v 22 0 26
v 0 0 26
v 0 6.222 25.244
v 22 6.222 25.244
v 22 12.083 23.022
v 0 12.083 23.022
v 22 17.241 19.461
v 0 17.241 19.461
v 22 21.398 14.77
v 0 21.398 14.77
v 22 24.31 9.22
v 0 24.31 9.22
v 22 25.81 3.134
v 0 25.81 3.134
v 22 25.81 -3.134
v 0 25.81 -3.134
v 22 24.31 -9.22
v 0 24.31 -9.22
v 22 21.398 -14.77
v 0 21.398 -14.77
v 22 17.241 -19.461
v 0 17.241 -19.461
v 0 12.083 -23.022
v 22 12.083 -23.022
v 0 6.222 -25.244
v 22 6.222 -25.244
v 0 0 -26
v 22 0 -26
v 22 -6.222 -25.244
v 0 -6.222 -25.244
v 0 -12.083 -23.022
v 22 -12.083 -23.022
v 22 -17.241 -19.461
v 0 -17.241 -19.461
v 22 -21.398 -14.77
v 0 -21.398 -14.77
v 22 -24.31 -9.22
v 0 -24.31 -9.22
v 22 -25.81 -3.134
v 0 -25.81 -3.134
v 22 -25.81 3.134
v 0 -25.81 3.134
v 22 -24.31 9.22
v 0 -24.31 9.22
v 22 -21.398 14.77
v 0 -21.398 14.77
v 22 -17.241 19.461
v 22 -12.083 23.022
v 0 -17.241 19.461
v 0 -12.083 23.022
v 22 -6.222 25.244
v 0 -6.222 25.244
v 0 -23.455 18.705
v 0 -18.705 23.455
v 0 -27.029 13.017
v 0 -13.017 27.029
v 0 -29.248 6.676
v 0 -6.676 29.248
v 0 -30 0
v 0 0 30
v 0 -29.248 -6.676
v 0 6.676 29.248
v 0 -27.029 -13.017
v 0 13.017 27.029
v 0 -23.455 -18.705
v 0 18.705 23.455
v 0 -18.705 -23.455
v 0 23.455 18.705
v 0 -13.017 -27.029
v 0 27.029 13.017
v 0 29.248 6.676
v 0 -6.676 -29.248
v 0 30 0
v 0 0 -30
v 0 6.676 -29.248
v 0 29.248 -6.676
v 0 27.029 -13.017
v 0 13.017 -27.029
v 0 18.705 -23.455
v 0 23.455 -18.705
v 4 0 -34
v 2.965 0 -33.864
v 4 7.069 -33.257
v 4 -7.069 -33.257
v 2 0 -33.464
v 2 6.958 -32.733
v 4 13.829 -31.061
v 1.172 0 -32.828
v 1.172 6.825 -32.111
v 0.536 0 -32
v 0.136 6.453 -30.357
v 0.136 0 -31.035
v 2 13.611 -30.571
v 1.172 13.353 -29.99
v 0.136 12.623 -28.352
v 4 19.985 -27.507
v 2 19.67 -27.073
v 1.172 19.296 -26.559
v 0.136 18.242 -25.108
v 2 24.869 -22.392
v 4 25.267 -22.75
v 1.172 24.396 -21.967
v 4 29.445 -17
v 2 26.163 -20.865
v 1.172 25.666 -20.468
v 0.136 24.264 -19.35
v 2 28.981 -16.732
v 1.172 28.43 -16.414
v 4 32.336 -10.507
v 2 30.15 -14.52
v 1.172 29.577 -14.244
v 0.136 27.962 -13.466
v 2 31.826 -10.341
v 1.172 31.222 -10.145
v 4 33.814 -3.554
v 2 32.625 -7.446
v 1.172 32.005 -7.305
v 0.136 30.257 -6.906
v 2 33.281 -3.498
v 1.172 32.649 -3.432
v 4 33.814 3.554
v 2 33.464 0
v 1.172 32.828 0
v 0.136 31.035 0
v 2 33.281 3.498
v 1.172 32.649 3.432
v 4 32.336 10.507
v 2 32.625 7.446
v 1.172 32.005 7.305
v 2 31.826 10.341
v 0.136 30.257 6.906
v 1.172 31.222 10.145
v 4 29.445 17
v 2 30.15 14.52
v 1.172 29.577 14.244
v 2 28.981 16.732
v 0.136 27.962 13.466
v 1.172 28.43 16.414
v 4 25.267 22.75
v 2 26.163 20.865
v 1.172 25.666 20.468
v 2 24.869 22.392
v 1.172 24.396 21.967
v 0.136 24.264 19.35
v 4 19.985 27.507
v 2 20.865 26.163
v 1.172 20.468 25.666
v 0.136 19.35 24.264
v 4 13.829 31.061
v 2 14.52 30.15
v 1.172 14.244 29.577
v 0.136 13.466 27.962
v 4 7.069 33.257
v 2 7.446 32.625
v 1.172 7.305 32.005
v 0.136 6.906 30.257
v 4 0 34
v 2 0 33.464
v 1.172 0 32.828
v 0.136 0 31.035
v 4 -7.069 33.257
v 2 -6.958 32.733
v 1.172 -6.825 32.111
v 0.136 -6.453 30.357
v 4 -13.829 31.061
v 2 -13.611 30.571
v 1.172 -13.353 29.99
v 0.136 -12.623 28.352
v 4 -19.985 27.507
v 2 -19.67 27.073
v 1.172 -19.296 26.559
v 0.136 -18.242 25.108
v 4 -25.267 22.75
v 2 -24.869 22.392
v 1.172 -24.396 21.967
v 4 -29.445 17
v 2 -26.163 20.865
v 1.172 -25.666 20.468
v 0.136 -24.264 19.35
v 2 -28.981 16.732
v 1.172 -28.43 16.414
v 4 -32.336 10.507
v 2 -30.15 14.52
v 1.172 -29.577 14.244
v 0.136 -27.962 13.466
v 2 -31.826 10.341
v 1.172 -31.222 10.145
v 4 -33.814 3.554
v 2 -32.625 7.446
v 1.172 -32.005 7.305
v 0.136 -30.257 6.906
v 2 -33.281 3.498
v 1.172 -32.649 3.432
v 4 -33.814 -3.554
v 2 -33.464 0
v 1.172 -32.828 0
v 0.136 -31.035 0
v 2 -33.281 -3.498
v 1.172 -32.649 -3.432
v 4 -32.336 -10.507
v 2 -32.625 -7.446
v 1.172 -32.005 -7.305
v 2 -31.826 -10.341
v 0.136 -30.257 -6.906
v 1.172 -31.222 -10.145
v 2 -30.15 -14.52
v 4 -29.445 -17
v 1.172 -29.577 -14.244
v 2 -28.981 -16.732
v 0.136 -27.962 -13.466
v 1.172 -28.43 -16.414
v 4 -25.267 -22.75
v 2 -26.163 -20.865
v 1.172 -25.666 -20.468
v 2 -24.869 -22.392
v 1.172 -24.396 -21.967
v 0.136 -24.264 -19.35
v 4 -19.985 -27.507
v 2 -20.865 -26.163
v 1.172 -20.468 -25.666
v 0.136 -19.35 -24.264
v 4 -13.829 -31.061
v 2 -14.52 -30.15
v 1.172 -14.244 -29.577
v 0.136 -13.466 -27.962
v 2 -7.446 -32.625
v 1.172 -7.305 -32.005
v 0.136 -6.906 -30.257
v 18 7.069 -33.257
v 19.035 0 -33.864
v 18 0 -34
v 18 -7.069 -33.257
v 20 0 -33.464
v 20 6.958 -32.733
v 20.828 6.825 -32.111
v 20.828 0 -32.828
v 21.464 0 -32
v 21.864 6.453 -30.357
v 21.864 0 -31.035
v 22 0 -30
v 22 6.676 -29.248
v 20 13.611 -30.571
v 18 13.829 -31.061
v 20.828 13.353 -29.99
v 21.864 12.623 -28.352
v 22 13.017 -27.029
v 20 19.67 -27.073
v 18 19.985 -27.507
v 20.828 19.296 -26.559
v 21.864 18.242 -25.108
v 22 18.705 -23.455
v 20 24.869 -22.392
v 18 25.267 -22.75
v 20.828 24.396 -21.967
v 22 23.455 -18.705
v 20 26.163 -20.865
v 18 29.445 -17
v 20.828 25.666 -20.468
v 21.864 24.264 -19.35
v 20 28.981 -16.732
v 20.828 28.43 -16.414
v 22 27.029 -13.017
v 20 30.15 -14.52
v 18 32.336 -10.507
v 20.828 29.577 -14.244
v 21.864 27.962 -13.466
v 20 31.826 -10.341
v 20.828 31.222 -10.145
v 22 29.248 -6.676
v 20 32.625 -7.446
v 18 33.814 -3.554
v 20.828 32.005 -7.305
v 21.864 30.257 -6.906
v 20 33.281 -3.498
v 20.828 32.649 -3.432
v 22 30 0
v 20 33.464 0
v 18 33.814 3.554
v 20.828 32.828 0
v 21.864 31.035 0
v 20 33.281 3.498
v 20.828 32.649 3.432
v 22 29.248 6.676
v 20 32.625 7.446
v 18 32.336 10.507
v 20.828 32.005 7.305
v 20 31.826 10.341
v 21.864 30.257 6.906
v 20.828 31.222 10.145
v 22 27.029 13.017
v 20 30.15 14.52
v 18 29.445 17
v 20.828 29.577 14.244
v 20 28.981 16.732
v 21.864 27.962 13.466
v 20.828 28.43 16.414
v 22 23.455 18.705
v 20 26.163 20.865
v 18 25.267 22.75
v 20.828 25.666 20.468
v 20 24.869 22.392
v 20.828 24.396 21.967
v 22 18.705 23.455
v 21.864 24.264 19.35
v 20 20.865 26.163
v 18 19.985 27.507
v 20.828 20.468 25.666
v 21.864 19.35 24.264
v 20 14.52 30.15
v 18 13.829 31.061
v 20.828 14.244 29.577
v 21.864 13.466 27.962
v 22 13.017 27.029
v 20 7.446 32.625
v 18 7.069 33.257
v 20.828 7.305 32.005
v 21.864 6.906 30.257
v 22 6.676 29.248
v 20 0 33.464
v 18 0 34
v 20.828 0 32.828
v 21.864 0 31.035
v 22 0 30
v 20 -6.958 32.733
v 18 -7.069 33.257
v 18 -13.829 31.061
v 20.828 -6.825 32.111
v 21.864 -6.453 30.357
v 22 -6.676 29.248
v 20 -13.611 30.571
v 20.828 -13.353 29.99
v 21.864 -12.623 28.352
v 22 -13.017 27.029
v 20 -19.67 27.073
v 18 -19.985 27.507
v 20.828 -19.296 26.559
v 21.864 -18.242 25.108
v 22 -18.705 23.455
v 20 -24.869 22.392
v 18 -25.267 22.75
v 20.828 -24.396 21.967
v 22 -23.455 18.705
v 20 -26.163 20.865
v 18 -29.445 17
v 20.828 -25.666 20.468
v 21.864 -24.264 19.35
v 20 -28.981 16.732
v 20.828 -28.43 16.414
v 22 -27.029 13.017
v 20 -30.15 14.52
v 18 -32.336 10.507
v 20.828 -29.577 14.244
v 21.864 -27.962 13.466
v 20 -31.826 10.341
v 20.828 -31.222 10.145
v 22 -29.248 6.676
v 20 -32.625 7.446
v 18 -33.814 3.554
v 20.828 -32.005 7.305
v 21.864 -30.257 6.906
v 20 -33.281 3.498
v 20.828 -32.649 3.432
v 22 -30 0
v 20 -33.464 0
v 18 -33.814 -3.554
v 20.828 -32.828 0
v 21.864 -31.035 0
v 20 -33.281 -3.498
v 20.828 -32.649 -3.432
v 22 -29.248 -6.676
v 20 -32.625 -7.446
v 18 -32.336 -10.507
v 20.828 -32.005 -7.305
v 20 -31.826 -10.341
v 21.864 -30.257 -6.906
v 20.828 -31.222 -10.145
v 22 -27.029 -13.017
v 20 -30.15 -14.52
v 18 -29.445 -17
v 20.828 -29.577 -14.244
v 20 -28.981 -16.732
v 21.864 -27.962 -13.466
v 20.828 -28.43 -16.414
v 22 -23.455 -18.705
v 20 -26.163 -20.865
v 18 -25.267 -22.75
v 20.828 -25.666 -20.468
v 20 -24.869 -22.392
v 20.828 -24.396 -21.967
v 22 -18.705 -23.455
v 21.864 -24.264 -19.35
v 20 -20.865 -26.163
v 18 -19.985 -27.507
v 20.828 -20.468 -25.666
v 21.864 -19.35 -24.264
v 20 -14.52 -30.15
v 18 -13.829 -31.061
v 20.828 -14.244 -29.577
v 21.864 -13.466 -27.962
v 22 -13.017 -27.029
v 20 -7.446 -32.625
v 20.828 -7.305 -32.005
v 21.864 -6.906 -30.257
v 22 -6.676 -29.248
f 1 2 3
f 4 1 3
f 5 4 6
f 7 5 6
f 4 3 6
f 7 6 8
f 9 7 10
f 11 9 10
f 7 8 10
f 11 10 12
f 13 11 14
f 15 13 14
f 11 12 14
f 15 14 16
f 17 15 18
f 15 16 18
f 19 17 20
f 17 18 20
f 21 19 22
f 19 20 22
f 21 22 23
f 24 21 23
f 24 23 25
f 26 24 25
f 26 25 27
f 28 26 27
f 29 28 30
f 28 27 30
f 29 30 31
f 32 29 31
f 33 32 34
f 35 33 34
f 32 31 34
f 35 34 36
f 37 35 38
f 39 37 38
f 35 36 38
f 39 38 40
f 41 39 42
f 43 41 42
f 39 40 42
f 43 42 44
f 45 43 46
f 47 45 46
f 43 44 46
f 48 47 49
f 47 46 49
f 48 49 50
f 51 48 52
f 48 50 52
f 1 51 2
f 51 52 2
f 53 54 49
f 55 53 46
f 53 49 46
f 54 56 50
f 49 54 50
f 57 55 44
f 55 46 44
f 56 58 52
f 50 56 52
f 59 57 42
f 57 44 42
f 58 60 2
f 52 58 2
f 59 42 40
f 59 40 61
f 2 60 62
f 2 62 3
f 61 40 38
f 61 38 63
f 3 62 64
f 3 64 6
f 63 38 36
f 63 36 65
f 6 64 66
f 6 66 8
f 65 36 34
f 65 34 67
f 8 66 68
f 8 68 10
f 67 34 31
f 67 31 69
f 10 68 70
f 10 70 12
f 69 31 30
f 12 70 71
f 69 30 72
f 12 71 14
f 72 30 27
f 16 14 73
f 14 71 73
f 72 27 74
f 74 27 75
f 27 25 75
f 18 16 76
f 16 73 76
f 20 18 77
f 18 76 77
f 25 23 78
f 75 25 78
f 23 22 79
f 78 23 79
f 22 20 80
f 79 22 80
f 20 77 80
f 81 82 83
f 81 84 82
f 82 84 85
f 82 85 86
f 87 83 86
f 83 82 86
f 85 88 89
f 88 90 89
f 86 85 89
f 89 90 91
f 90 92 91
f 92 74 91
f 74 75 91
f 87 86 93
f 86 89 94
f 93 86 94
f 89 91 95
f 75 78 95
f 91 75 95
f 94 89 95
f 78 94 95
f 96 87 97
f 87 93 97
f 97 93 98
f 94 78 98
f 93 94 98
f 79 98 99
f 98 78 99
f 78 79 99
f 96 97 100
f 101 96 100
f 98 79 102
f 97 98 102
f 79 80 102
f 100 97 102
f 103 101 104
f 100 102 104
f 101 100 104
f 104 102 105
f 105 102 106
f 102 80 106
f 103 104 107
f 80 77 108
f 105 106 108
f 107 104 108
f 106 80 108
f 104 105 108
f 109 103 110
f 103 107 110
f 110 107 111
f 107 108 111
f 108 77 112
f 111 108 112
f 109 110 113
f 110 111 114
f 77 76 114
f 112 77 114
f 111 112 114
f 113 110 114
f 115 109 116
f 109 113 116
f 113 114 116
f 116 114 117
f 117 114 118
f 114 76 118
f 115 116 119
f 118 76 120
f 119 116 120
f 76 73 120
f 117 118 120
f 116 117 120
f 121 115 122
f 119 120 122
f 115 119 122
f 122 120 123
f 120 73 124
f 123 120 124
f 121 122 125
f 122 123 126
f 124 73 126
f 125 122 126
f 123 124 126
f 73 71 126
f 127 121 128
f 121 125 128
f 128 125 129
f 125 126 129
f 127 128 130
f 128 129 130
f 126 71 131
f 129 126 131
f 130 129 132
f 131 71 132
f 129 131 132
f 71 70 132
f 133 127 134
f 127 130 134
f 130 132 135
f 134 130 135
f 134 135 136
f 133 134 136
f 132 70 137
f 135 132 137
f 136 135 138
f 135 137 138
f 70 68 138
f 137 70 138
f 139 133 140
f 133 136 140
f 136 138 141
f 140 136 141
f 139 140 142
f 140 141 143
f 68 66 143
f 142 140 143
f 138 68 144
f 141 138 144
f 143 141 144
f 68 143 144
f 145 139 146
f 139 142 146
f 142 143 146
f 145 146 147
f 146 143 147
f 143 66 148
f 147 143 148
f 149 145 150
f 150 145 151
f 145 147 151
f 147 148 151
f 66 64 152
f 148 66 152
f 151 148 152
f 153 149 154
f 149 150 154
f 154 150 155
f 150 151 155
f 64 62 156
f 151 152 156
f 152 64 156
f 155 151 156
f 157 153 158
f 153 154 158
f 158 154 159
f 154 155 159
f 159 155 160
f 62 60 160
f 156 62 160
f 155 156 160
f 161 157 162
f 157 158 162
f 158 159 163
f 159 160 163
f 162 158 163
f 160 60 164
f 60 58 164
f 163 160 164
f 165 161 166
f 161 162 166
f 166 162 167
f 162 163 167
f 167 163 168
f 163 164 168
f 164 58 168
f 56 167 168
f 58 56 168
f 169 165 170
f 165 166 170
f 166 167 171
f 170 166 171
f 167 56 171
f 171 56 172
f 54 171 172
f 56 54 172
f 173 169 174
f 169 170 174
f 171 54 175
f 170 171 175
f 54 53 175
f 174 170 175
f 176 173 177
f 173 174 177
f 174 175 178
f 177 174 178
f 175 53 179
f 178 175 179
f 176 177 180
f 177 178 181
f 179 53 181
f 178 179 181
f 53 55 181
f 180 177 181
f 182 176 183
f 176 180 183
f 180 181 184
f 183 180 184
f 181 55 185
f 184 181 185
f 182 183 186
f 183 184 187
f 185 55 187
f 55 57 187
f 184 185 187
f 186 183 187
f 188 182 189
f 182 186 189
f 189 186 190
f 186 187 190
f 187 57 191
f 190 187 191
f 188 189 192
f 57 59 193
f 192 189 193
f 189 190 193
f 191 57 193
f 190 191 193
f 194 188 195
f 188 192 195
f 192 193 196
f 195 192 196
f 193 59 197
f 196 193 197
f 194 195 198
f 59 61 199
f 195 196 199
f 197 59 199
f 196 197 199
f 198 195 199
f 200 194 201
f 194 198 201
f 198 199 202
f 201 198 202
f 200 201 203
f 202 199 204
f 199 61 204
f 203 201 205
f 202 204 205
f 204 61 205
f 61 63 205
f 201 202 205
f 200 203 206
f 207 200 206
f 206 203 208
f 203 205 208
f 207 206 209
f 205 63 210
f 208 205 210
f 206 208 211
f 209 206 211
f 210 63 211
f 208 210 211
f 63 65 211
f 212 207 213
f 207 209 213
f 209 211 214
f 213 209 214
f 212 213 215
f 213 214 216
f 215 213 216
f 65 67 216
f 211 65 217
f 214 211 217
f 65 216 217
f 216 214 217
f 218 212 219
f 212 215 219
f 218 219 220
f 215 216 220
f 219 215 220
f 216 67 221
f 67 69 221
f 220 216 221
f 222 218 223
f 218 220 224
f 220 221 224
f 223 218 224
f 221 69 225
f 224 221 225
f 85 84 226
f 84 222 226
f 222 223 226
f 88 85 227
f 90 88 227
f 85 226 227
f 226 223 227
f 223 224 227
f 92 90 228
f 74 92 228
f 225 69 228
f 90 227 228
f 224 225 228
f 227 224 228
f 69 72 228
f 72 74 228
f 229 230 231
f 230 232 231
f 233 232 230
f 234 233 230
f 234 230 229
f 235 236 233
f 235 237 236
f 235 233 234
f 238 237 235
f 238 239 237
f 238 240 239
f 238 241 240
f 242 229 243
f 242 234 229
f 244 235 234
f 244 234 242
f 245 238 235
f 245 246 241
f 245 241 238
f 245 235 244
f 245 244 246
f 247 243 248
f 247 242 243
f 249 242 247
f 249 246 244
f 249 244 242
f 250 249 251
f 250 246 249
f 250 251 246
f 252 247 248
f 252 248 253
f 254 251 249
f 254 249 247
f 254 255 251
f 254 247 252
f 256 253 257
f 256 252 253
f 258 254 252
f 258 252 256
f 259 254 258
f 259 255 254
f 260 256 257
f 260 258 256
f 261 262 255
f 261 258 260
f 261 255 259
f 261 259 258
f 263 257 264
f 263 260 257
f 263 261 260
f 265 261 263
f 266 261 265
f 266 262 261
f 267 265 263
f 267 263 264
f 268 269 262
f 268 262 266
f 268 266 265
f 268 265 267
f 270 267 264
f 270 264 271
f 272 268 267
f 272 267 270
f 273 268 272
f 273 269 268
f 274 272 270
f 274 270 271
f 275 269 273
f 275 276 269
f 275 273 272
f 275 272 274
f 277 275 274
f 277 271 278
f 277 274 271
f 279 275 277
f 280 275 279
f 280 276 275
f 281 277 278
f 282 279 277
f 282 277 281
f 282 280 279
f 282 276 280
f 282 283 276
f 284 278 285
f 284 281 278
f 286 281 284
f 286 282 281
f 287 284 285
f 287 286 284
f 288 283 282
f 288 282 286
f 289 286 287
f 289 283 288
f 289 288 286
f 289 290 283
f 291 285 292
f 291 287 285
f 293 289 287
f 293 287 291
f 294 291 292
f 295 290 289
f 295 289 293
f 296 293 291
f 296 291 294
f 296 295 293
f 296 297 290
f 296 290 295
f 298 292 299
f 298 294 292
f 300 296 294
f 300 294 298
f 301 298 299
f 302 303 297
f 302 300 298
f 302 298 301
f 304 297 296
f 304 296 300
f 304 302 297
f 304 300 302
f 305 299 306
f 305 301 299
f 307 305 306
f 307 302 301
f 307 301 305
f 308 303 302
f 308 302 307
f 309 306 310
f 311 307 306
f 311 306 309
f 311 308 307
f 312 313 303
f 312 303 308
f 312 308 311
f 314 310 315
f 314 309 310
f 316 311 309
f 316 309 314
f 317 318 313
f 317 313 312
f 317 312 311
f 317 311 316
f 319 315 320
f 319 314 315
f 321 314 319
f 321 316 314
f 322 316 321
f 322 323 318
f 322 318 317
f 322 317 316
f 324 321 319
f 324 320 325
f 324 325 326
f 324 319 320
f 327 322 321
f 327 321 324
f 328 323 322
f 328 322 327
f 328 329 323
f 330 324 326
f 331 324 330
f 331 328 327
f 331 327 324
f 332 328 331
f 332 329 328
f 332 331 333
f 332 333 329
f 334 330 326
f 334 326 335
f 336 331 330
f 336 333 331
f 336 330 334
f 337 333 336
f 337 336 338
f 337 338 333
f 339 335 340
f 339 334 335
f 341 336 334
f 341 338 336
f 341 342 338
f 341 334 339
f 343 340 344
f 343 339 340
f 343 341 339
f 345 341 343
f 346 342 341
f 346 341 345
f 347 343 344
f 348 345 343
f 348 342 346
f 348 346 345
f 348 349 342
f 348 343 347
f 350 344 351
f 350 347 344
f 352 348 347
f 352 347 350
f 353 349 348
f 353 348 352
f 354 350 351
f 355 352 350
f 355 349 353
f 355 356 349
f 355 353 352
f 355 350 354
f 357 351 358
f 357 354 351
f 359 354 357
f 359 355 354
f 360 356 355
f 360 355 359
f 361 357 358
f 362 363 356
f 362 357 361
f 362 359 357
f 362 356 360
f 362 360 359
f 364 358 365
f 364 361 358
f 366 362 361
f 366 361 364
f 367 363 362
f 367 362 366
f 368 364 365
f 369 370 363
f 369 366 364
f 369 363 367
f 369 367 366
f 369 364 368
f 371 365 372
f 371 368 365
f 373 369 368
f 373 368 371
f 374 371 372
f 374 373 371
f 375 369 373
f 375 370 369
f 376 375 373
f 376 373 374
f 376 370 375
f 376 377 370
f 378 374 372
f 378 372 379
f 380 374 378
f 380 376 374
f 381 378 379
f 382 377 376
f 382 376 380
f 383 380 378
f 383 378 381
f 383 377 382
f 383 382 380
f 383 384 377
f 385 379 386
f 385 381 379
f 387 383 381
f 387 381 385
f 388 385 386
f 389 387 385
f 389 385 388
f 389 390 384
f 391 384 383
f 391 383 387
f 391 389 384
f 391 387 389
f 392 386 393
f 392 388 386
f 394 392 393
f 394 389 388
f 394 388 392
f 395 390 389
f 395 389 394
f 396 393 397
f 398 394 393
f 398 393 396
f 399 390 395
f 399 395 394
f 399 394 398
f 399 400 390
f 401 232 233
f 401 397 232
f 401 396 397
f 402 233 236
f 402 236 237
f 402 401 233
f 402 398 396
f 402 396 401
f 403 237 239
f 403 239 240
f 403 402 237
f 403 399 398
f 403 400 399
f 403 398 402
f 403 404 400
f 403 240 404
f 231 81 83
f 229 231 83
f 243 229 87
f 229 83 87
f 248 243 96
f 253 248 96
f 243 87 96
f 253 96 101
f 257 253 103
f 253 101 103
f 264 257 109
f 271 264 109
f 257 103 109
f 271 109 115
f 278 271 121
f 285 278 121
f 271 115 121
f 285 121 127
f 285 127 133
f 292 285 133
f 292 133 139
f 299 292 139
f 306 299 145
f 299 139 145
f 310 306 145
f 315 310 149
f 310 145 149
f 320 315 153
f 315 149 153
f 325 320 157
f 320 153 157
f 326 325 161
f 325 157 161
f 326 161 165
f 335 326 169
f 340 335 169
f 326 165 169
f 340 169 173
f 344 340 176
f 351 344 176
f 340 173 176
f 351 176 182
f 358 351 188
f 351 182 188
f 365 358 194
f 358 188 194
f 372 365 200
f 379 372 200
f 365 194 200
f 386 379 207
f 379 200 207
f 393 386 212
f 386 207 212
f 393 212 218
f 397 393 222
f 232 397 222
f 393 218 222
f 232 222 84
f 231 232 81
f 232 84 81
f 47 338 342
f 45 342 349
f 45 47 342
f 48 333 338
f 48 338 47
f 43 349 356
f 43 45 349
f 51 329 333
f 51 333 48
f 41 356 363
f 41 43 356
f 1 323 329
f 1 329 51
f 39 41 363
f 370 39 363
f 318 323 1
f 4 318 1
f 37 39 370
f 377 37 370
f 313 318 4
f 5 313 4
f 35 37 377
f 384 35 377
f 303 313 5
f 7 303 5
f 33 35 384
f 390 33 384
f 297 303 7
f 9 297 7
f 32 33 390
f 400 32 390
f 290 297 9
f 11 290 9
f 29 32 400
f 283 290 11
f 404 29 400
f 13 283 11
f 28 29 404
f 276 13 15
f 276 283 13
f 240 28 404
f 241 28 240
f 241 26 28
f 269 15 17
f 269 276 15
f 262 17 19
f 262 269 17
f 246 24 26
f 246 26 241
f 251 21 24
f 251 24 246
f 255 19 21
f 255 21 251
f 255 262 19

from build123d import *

# Parameters (mm, degrees)
SKETCH_1_R          = 34
EXTRUDE_1_DEPTH     = 22
SKETCH_2_R          = 26
CUT_EXTRUDE_1_DEPTH = 22
FILLET_1_R          = 4


with BuildPart() as part:
    # 草图1 → 凸台-拉伸1 (new body)
    with BuildSketch(Plane(origin=(0, 0, 0), x_dir=(0, 0, -1), z_dir=(1, 0, 0))):
        Circle(SKETCH_1_R)
    extrude(amount=EXTRUDE_1_DEPTH)

    # 草图2 → 切除-拉伸1 (cut)
    with BuildSketch(Plane.ZY):
        Circle(SKETCH_2_R)
    extrude(amount=-CUT_EXTRUDE_1_DEPTH, mode=Mode.SUBTRACT)

    # 圆角1
    fillet_1_edges = [part.edges().sort_by_distance(p)[0] for p in [
        (0, 0, 34),
        (22, 0, 34),
    ]]
    fillet(fillet_1_edges, radius=FILLET_1_R)


solid = part.part
